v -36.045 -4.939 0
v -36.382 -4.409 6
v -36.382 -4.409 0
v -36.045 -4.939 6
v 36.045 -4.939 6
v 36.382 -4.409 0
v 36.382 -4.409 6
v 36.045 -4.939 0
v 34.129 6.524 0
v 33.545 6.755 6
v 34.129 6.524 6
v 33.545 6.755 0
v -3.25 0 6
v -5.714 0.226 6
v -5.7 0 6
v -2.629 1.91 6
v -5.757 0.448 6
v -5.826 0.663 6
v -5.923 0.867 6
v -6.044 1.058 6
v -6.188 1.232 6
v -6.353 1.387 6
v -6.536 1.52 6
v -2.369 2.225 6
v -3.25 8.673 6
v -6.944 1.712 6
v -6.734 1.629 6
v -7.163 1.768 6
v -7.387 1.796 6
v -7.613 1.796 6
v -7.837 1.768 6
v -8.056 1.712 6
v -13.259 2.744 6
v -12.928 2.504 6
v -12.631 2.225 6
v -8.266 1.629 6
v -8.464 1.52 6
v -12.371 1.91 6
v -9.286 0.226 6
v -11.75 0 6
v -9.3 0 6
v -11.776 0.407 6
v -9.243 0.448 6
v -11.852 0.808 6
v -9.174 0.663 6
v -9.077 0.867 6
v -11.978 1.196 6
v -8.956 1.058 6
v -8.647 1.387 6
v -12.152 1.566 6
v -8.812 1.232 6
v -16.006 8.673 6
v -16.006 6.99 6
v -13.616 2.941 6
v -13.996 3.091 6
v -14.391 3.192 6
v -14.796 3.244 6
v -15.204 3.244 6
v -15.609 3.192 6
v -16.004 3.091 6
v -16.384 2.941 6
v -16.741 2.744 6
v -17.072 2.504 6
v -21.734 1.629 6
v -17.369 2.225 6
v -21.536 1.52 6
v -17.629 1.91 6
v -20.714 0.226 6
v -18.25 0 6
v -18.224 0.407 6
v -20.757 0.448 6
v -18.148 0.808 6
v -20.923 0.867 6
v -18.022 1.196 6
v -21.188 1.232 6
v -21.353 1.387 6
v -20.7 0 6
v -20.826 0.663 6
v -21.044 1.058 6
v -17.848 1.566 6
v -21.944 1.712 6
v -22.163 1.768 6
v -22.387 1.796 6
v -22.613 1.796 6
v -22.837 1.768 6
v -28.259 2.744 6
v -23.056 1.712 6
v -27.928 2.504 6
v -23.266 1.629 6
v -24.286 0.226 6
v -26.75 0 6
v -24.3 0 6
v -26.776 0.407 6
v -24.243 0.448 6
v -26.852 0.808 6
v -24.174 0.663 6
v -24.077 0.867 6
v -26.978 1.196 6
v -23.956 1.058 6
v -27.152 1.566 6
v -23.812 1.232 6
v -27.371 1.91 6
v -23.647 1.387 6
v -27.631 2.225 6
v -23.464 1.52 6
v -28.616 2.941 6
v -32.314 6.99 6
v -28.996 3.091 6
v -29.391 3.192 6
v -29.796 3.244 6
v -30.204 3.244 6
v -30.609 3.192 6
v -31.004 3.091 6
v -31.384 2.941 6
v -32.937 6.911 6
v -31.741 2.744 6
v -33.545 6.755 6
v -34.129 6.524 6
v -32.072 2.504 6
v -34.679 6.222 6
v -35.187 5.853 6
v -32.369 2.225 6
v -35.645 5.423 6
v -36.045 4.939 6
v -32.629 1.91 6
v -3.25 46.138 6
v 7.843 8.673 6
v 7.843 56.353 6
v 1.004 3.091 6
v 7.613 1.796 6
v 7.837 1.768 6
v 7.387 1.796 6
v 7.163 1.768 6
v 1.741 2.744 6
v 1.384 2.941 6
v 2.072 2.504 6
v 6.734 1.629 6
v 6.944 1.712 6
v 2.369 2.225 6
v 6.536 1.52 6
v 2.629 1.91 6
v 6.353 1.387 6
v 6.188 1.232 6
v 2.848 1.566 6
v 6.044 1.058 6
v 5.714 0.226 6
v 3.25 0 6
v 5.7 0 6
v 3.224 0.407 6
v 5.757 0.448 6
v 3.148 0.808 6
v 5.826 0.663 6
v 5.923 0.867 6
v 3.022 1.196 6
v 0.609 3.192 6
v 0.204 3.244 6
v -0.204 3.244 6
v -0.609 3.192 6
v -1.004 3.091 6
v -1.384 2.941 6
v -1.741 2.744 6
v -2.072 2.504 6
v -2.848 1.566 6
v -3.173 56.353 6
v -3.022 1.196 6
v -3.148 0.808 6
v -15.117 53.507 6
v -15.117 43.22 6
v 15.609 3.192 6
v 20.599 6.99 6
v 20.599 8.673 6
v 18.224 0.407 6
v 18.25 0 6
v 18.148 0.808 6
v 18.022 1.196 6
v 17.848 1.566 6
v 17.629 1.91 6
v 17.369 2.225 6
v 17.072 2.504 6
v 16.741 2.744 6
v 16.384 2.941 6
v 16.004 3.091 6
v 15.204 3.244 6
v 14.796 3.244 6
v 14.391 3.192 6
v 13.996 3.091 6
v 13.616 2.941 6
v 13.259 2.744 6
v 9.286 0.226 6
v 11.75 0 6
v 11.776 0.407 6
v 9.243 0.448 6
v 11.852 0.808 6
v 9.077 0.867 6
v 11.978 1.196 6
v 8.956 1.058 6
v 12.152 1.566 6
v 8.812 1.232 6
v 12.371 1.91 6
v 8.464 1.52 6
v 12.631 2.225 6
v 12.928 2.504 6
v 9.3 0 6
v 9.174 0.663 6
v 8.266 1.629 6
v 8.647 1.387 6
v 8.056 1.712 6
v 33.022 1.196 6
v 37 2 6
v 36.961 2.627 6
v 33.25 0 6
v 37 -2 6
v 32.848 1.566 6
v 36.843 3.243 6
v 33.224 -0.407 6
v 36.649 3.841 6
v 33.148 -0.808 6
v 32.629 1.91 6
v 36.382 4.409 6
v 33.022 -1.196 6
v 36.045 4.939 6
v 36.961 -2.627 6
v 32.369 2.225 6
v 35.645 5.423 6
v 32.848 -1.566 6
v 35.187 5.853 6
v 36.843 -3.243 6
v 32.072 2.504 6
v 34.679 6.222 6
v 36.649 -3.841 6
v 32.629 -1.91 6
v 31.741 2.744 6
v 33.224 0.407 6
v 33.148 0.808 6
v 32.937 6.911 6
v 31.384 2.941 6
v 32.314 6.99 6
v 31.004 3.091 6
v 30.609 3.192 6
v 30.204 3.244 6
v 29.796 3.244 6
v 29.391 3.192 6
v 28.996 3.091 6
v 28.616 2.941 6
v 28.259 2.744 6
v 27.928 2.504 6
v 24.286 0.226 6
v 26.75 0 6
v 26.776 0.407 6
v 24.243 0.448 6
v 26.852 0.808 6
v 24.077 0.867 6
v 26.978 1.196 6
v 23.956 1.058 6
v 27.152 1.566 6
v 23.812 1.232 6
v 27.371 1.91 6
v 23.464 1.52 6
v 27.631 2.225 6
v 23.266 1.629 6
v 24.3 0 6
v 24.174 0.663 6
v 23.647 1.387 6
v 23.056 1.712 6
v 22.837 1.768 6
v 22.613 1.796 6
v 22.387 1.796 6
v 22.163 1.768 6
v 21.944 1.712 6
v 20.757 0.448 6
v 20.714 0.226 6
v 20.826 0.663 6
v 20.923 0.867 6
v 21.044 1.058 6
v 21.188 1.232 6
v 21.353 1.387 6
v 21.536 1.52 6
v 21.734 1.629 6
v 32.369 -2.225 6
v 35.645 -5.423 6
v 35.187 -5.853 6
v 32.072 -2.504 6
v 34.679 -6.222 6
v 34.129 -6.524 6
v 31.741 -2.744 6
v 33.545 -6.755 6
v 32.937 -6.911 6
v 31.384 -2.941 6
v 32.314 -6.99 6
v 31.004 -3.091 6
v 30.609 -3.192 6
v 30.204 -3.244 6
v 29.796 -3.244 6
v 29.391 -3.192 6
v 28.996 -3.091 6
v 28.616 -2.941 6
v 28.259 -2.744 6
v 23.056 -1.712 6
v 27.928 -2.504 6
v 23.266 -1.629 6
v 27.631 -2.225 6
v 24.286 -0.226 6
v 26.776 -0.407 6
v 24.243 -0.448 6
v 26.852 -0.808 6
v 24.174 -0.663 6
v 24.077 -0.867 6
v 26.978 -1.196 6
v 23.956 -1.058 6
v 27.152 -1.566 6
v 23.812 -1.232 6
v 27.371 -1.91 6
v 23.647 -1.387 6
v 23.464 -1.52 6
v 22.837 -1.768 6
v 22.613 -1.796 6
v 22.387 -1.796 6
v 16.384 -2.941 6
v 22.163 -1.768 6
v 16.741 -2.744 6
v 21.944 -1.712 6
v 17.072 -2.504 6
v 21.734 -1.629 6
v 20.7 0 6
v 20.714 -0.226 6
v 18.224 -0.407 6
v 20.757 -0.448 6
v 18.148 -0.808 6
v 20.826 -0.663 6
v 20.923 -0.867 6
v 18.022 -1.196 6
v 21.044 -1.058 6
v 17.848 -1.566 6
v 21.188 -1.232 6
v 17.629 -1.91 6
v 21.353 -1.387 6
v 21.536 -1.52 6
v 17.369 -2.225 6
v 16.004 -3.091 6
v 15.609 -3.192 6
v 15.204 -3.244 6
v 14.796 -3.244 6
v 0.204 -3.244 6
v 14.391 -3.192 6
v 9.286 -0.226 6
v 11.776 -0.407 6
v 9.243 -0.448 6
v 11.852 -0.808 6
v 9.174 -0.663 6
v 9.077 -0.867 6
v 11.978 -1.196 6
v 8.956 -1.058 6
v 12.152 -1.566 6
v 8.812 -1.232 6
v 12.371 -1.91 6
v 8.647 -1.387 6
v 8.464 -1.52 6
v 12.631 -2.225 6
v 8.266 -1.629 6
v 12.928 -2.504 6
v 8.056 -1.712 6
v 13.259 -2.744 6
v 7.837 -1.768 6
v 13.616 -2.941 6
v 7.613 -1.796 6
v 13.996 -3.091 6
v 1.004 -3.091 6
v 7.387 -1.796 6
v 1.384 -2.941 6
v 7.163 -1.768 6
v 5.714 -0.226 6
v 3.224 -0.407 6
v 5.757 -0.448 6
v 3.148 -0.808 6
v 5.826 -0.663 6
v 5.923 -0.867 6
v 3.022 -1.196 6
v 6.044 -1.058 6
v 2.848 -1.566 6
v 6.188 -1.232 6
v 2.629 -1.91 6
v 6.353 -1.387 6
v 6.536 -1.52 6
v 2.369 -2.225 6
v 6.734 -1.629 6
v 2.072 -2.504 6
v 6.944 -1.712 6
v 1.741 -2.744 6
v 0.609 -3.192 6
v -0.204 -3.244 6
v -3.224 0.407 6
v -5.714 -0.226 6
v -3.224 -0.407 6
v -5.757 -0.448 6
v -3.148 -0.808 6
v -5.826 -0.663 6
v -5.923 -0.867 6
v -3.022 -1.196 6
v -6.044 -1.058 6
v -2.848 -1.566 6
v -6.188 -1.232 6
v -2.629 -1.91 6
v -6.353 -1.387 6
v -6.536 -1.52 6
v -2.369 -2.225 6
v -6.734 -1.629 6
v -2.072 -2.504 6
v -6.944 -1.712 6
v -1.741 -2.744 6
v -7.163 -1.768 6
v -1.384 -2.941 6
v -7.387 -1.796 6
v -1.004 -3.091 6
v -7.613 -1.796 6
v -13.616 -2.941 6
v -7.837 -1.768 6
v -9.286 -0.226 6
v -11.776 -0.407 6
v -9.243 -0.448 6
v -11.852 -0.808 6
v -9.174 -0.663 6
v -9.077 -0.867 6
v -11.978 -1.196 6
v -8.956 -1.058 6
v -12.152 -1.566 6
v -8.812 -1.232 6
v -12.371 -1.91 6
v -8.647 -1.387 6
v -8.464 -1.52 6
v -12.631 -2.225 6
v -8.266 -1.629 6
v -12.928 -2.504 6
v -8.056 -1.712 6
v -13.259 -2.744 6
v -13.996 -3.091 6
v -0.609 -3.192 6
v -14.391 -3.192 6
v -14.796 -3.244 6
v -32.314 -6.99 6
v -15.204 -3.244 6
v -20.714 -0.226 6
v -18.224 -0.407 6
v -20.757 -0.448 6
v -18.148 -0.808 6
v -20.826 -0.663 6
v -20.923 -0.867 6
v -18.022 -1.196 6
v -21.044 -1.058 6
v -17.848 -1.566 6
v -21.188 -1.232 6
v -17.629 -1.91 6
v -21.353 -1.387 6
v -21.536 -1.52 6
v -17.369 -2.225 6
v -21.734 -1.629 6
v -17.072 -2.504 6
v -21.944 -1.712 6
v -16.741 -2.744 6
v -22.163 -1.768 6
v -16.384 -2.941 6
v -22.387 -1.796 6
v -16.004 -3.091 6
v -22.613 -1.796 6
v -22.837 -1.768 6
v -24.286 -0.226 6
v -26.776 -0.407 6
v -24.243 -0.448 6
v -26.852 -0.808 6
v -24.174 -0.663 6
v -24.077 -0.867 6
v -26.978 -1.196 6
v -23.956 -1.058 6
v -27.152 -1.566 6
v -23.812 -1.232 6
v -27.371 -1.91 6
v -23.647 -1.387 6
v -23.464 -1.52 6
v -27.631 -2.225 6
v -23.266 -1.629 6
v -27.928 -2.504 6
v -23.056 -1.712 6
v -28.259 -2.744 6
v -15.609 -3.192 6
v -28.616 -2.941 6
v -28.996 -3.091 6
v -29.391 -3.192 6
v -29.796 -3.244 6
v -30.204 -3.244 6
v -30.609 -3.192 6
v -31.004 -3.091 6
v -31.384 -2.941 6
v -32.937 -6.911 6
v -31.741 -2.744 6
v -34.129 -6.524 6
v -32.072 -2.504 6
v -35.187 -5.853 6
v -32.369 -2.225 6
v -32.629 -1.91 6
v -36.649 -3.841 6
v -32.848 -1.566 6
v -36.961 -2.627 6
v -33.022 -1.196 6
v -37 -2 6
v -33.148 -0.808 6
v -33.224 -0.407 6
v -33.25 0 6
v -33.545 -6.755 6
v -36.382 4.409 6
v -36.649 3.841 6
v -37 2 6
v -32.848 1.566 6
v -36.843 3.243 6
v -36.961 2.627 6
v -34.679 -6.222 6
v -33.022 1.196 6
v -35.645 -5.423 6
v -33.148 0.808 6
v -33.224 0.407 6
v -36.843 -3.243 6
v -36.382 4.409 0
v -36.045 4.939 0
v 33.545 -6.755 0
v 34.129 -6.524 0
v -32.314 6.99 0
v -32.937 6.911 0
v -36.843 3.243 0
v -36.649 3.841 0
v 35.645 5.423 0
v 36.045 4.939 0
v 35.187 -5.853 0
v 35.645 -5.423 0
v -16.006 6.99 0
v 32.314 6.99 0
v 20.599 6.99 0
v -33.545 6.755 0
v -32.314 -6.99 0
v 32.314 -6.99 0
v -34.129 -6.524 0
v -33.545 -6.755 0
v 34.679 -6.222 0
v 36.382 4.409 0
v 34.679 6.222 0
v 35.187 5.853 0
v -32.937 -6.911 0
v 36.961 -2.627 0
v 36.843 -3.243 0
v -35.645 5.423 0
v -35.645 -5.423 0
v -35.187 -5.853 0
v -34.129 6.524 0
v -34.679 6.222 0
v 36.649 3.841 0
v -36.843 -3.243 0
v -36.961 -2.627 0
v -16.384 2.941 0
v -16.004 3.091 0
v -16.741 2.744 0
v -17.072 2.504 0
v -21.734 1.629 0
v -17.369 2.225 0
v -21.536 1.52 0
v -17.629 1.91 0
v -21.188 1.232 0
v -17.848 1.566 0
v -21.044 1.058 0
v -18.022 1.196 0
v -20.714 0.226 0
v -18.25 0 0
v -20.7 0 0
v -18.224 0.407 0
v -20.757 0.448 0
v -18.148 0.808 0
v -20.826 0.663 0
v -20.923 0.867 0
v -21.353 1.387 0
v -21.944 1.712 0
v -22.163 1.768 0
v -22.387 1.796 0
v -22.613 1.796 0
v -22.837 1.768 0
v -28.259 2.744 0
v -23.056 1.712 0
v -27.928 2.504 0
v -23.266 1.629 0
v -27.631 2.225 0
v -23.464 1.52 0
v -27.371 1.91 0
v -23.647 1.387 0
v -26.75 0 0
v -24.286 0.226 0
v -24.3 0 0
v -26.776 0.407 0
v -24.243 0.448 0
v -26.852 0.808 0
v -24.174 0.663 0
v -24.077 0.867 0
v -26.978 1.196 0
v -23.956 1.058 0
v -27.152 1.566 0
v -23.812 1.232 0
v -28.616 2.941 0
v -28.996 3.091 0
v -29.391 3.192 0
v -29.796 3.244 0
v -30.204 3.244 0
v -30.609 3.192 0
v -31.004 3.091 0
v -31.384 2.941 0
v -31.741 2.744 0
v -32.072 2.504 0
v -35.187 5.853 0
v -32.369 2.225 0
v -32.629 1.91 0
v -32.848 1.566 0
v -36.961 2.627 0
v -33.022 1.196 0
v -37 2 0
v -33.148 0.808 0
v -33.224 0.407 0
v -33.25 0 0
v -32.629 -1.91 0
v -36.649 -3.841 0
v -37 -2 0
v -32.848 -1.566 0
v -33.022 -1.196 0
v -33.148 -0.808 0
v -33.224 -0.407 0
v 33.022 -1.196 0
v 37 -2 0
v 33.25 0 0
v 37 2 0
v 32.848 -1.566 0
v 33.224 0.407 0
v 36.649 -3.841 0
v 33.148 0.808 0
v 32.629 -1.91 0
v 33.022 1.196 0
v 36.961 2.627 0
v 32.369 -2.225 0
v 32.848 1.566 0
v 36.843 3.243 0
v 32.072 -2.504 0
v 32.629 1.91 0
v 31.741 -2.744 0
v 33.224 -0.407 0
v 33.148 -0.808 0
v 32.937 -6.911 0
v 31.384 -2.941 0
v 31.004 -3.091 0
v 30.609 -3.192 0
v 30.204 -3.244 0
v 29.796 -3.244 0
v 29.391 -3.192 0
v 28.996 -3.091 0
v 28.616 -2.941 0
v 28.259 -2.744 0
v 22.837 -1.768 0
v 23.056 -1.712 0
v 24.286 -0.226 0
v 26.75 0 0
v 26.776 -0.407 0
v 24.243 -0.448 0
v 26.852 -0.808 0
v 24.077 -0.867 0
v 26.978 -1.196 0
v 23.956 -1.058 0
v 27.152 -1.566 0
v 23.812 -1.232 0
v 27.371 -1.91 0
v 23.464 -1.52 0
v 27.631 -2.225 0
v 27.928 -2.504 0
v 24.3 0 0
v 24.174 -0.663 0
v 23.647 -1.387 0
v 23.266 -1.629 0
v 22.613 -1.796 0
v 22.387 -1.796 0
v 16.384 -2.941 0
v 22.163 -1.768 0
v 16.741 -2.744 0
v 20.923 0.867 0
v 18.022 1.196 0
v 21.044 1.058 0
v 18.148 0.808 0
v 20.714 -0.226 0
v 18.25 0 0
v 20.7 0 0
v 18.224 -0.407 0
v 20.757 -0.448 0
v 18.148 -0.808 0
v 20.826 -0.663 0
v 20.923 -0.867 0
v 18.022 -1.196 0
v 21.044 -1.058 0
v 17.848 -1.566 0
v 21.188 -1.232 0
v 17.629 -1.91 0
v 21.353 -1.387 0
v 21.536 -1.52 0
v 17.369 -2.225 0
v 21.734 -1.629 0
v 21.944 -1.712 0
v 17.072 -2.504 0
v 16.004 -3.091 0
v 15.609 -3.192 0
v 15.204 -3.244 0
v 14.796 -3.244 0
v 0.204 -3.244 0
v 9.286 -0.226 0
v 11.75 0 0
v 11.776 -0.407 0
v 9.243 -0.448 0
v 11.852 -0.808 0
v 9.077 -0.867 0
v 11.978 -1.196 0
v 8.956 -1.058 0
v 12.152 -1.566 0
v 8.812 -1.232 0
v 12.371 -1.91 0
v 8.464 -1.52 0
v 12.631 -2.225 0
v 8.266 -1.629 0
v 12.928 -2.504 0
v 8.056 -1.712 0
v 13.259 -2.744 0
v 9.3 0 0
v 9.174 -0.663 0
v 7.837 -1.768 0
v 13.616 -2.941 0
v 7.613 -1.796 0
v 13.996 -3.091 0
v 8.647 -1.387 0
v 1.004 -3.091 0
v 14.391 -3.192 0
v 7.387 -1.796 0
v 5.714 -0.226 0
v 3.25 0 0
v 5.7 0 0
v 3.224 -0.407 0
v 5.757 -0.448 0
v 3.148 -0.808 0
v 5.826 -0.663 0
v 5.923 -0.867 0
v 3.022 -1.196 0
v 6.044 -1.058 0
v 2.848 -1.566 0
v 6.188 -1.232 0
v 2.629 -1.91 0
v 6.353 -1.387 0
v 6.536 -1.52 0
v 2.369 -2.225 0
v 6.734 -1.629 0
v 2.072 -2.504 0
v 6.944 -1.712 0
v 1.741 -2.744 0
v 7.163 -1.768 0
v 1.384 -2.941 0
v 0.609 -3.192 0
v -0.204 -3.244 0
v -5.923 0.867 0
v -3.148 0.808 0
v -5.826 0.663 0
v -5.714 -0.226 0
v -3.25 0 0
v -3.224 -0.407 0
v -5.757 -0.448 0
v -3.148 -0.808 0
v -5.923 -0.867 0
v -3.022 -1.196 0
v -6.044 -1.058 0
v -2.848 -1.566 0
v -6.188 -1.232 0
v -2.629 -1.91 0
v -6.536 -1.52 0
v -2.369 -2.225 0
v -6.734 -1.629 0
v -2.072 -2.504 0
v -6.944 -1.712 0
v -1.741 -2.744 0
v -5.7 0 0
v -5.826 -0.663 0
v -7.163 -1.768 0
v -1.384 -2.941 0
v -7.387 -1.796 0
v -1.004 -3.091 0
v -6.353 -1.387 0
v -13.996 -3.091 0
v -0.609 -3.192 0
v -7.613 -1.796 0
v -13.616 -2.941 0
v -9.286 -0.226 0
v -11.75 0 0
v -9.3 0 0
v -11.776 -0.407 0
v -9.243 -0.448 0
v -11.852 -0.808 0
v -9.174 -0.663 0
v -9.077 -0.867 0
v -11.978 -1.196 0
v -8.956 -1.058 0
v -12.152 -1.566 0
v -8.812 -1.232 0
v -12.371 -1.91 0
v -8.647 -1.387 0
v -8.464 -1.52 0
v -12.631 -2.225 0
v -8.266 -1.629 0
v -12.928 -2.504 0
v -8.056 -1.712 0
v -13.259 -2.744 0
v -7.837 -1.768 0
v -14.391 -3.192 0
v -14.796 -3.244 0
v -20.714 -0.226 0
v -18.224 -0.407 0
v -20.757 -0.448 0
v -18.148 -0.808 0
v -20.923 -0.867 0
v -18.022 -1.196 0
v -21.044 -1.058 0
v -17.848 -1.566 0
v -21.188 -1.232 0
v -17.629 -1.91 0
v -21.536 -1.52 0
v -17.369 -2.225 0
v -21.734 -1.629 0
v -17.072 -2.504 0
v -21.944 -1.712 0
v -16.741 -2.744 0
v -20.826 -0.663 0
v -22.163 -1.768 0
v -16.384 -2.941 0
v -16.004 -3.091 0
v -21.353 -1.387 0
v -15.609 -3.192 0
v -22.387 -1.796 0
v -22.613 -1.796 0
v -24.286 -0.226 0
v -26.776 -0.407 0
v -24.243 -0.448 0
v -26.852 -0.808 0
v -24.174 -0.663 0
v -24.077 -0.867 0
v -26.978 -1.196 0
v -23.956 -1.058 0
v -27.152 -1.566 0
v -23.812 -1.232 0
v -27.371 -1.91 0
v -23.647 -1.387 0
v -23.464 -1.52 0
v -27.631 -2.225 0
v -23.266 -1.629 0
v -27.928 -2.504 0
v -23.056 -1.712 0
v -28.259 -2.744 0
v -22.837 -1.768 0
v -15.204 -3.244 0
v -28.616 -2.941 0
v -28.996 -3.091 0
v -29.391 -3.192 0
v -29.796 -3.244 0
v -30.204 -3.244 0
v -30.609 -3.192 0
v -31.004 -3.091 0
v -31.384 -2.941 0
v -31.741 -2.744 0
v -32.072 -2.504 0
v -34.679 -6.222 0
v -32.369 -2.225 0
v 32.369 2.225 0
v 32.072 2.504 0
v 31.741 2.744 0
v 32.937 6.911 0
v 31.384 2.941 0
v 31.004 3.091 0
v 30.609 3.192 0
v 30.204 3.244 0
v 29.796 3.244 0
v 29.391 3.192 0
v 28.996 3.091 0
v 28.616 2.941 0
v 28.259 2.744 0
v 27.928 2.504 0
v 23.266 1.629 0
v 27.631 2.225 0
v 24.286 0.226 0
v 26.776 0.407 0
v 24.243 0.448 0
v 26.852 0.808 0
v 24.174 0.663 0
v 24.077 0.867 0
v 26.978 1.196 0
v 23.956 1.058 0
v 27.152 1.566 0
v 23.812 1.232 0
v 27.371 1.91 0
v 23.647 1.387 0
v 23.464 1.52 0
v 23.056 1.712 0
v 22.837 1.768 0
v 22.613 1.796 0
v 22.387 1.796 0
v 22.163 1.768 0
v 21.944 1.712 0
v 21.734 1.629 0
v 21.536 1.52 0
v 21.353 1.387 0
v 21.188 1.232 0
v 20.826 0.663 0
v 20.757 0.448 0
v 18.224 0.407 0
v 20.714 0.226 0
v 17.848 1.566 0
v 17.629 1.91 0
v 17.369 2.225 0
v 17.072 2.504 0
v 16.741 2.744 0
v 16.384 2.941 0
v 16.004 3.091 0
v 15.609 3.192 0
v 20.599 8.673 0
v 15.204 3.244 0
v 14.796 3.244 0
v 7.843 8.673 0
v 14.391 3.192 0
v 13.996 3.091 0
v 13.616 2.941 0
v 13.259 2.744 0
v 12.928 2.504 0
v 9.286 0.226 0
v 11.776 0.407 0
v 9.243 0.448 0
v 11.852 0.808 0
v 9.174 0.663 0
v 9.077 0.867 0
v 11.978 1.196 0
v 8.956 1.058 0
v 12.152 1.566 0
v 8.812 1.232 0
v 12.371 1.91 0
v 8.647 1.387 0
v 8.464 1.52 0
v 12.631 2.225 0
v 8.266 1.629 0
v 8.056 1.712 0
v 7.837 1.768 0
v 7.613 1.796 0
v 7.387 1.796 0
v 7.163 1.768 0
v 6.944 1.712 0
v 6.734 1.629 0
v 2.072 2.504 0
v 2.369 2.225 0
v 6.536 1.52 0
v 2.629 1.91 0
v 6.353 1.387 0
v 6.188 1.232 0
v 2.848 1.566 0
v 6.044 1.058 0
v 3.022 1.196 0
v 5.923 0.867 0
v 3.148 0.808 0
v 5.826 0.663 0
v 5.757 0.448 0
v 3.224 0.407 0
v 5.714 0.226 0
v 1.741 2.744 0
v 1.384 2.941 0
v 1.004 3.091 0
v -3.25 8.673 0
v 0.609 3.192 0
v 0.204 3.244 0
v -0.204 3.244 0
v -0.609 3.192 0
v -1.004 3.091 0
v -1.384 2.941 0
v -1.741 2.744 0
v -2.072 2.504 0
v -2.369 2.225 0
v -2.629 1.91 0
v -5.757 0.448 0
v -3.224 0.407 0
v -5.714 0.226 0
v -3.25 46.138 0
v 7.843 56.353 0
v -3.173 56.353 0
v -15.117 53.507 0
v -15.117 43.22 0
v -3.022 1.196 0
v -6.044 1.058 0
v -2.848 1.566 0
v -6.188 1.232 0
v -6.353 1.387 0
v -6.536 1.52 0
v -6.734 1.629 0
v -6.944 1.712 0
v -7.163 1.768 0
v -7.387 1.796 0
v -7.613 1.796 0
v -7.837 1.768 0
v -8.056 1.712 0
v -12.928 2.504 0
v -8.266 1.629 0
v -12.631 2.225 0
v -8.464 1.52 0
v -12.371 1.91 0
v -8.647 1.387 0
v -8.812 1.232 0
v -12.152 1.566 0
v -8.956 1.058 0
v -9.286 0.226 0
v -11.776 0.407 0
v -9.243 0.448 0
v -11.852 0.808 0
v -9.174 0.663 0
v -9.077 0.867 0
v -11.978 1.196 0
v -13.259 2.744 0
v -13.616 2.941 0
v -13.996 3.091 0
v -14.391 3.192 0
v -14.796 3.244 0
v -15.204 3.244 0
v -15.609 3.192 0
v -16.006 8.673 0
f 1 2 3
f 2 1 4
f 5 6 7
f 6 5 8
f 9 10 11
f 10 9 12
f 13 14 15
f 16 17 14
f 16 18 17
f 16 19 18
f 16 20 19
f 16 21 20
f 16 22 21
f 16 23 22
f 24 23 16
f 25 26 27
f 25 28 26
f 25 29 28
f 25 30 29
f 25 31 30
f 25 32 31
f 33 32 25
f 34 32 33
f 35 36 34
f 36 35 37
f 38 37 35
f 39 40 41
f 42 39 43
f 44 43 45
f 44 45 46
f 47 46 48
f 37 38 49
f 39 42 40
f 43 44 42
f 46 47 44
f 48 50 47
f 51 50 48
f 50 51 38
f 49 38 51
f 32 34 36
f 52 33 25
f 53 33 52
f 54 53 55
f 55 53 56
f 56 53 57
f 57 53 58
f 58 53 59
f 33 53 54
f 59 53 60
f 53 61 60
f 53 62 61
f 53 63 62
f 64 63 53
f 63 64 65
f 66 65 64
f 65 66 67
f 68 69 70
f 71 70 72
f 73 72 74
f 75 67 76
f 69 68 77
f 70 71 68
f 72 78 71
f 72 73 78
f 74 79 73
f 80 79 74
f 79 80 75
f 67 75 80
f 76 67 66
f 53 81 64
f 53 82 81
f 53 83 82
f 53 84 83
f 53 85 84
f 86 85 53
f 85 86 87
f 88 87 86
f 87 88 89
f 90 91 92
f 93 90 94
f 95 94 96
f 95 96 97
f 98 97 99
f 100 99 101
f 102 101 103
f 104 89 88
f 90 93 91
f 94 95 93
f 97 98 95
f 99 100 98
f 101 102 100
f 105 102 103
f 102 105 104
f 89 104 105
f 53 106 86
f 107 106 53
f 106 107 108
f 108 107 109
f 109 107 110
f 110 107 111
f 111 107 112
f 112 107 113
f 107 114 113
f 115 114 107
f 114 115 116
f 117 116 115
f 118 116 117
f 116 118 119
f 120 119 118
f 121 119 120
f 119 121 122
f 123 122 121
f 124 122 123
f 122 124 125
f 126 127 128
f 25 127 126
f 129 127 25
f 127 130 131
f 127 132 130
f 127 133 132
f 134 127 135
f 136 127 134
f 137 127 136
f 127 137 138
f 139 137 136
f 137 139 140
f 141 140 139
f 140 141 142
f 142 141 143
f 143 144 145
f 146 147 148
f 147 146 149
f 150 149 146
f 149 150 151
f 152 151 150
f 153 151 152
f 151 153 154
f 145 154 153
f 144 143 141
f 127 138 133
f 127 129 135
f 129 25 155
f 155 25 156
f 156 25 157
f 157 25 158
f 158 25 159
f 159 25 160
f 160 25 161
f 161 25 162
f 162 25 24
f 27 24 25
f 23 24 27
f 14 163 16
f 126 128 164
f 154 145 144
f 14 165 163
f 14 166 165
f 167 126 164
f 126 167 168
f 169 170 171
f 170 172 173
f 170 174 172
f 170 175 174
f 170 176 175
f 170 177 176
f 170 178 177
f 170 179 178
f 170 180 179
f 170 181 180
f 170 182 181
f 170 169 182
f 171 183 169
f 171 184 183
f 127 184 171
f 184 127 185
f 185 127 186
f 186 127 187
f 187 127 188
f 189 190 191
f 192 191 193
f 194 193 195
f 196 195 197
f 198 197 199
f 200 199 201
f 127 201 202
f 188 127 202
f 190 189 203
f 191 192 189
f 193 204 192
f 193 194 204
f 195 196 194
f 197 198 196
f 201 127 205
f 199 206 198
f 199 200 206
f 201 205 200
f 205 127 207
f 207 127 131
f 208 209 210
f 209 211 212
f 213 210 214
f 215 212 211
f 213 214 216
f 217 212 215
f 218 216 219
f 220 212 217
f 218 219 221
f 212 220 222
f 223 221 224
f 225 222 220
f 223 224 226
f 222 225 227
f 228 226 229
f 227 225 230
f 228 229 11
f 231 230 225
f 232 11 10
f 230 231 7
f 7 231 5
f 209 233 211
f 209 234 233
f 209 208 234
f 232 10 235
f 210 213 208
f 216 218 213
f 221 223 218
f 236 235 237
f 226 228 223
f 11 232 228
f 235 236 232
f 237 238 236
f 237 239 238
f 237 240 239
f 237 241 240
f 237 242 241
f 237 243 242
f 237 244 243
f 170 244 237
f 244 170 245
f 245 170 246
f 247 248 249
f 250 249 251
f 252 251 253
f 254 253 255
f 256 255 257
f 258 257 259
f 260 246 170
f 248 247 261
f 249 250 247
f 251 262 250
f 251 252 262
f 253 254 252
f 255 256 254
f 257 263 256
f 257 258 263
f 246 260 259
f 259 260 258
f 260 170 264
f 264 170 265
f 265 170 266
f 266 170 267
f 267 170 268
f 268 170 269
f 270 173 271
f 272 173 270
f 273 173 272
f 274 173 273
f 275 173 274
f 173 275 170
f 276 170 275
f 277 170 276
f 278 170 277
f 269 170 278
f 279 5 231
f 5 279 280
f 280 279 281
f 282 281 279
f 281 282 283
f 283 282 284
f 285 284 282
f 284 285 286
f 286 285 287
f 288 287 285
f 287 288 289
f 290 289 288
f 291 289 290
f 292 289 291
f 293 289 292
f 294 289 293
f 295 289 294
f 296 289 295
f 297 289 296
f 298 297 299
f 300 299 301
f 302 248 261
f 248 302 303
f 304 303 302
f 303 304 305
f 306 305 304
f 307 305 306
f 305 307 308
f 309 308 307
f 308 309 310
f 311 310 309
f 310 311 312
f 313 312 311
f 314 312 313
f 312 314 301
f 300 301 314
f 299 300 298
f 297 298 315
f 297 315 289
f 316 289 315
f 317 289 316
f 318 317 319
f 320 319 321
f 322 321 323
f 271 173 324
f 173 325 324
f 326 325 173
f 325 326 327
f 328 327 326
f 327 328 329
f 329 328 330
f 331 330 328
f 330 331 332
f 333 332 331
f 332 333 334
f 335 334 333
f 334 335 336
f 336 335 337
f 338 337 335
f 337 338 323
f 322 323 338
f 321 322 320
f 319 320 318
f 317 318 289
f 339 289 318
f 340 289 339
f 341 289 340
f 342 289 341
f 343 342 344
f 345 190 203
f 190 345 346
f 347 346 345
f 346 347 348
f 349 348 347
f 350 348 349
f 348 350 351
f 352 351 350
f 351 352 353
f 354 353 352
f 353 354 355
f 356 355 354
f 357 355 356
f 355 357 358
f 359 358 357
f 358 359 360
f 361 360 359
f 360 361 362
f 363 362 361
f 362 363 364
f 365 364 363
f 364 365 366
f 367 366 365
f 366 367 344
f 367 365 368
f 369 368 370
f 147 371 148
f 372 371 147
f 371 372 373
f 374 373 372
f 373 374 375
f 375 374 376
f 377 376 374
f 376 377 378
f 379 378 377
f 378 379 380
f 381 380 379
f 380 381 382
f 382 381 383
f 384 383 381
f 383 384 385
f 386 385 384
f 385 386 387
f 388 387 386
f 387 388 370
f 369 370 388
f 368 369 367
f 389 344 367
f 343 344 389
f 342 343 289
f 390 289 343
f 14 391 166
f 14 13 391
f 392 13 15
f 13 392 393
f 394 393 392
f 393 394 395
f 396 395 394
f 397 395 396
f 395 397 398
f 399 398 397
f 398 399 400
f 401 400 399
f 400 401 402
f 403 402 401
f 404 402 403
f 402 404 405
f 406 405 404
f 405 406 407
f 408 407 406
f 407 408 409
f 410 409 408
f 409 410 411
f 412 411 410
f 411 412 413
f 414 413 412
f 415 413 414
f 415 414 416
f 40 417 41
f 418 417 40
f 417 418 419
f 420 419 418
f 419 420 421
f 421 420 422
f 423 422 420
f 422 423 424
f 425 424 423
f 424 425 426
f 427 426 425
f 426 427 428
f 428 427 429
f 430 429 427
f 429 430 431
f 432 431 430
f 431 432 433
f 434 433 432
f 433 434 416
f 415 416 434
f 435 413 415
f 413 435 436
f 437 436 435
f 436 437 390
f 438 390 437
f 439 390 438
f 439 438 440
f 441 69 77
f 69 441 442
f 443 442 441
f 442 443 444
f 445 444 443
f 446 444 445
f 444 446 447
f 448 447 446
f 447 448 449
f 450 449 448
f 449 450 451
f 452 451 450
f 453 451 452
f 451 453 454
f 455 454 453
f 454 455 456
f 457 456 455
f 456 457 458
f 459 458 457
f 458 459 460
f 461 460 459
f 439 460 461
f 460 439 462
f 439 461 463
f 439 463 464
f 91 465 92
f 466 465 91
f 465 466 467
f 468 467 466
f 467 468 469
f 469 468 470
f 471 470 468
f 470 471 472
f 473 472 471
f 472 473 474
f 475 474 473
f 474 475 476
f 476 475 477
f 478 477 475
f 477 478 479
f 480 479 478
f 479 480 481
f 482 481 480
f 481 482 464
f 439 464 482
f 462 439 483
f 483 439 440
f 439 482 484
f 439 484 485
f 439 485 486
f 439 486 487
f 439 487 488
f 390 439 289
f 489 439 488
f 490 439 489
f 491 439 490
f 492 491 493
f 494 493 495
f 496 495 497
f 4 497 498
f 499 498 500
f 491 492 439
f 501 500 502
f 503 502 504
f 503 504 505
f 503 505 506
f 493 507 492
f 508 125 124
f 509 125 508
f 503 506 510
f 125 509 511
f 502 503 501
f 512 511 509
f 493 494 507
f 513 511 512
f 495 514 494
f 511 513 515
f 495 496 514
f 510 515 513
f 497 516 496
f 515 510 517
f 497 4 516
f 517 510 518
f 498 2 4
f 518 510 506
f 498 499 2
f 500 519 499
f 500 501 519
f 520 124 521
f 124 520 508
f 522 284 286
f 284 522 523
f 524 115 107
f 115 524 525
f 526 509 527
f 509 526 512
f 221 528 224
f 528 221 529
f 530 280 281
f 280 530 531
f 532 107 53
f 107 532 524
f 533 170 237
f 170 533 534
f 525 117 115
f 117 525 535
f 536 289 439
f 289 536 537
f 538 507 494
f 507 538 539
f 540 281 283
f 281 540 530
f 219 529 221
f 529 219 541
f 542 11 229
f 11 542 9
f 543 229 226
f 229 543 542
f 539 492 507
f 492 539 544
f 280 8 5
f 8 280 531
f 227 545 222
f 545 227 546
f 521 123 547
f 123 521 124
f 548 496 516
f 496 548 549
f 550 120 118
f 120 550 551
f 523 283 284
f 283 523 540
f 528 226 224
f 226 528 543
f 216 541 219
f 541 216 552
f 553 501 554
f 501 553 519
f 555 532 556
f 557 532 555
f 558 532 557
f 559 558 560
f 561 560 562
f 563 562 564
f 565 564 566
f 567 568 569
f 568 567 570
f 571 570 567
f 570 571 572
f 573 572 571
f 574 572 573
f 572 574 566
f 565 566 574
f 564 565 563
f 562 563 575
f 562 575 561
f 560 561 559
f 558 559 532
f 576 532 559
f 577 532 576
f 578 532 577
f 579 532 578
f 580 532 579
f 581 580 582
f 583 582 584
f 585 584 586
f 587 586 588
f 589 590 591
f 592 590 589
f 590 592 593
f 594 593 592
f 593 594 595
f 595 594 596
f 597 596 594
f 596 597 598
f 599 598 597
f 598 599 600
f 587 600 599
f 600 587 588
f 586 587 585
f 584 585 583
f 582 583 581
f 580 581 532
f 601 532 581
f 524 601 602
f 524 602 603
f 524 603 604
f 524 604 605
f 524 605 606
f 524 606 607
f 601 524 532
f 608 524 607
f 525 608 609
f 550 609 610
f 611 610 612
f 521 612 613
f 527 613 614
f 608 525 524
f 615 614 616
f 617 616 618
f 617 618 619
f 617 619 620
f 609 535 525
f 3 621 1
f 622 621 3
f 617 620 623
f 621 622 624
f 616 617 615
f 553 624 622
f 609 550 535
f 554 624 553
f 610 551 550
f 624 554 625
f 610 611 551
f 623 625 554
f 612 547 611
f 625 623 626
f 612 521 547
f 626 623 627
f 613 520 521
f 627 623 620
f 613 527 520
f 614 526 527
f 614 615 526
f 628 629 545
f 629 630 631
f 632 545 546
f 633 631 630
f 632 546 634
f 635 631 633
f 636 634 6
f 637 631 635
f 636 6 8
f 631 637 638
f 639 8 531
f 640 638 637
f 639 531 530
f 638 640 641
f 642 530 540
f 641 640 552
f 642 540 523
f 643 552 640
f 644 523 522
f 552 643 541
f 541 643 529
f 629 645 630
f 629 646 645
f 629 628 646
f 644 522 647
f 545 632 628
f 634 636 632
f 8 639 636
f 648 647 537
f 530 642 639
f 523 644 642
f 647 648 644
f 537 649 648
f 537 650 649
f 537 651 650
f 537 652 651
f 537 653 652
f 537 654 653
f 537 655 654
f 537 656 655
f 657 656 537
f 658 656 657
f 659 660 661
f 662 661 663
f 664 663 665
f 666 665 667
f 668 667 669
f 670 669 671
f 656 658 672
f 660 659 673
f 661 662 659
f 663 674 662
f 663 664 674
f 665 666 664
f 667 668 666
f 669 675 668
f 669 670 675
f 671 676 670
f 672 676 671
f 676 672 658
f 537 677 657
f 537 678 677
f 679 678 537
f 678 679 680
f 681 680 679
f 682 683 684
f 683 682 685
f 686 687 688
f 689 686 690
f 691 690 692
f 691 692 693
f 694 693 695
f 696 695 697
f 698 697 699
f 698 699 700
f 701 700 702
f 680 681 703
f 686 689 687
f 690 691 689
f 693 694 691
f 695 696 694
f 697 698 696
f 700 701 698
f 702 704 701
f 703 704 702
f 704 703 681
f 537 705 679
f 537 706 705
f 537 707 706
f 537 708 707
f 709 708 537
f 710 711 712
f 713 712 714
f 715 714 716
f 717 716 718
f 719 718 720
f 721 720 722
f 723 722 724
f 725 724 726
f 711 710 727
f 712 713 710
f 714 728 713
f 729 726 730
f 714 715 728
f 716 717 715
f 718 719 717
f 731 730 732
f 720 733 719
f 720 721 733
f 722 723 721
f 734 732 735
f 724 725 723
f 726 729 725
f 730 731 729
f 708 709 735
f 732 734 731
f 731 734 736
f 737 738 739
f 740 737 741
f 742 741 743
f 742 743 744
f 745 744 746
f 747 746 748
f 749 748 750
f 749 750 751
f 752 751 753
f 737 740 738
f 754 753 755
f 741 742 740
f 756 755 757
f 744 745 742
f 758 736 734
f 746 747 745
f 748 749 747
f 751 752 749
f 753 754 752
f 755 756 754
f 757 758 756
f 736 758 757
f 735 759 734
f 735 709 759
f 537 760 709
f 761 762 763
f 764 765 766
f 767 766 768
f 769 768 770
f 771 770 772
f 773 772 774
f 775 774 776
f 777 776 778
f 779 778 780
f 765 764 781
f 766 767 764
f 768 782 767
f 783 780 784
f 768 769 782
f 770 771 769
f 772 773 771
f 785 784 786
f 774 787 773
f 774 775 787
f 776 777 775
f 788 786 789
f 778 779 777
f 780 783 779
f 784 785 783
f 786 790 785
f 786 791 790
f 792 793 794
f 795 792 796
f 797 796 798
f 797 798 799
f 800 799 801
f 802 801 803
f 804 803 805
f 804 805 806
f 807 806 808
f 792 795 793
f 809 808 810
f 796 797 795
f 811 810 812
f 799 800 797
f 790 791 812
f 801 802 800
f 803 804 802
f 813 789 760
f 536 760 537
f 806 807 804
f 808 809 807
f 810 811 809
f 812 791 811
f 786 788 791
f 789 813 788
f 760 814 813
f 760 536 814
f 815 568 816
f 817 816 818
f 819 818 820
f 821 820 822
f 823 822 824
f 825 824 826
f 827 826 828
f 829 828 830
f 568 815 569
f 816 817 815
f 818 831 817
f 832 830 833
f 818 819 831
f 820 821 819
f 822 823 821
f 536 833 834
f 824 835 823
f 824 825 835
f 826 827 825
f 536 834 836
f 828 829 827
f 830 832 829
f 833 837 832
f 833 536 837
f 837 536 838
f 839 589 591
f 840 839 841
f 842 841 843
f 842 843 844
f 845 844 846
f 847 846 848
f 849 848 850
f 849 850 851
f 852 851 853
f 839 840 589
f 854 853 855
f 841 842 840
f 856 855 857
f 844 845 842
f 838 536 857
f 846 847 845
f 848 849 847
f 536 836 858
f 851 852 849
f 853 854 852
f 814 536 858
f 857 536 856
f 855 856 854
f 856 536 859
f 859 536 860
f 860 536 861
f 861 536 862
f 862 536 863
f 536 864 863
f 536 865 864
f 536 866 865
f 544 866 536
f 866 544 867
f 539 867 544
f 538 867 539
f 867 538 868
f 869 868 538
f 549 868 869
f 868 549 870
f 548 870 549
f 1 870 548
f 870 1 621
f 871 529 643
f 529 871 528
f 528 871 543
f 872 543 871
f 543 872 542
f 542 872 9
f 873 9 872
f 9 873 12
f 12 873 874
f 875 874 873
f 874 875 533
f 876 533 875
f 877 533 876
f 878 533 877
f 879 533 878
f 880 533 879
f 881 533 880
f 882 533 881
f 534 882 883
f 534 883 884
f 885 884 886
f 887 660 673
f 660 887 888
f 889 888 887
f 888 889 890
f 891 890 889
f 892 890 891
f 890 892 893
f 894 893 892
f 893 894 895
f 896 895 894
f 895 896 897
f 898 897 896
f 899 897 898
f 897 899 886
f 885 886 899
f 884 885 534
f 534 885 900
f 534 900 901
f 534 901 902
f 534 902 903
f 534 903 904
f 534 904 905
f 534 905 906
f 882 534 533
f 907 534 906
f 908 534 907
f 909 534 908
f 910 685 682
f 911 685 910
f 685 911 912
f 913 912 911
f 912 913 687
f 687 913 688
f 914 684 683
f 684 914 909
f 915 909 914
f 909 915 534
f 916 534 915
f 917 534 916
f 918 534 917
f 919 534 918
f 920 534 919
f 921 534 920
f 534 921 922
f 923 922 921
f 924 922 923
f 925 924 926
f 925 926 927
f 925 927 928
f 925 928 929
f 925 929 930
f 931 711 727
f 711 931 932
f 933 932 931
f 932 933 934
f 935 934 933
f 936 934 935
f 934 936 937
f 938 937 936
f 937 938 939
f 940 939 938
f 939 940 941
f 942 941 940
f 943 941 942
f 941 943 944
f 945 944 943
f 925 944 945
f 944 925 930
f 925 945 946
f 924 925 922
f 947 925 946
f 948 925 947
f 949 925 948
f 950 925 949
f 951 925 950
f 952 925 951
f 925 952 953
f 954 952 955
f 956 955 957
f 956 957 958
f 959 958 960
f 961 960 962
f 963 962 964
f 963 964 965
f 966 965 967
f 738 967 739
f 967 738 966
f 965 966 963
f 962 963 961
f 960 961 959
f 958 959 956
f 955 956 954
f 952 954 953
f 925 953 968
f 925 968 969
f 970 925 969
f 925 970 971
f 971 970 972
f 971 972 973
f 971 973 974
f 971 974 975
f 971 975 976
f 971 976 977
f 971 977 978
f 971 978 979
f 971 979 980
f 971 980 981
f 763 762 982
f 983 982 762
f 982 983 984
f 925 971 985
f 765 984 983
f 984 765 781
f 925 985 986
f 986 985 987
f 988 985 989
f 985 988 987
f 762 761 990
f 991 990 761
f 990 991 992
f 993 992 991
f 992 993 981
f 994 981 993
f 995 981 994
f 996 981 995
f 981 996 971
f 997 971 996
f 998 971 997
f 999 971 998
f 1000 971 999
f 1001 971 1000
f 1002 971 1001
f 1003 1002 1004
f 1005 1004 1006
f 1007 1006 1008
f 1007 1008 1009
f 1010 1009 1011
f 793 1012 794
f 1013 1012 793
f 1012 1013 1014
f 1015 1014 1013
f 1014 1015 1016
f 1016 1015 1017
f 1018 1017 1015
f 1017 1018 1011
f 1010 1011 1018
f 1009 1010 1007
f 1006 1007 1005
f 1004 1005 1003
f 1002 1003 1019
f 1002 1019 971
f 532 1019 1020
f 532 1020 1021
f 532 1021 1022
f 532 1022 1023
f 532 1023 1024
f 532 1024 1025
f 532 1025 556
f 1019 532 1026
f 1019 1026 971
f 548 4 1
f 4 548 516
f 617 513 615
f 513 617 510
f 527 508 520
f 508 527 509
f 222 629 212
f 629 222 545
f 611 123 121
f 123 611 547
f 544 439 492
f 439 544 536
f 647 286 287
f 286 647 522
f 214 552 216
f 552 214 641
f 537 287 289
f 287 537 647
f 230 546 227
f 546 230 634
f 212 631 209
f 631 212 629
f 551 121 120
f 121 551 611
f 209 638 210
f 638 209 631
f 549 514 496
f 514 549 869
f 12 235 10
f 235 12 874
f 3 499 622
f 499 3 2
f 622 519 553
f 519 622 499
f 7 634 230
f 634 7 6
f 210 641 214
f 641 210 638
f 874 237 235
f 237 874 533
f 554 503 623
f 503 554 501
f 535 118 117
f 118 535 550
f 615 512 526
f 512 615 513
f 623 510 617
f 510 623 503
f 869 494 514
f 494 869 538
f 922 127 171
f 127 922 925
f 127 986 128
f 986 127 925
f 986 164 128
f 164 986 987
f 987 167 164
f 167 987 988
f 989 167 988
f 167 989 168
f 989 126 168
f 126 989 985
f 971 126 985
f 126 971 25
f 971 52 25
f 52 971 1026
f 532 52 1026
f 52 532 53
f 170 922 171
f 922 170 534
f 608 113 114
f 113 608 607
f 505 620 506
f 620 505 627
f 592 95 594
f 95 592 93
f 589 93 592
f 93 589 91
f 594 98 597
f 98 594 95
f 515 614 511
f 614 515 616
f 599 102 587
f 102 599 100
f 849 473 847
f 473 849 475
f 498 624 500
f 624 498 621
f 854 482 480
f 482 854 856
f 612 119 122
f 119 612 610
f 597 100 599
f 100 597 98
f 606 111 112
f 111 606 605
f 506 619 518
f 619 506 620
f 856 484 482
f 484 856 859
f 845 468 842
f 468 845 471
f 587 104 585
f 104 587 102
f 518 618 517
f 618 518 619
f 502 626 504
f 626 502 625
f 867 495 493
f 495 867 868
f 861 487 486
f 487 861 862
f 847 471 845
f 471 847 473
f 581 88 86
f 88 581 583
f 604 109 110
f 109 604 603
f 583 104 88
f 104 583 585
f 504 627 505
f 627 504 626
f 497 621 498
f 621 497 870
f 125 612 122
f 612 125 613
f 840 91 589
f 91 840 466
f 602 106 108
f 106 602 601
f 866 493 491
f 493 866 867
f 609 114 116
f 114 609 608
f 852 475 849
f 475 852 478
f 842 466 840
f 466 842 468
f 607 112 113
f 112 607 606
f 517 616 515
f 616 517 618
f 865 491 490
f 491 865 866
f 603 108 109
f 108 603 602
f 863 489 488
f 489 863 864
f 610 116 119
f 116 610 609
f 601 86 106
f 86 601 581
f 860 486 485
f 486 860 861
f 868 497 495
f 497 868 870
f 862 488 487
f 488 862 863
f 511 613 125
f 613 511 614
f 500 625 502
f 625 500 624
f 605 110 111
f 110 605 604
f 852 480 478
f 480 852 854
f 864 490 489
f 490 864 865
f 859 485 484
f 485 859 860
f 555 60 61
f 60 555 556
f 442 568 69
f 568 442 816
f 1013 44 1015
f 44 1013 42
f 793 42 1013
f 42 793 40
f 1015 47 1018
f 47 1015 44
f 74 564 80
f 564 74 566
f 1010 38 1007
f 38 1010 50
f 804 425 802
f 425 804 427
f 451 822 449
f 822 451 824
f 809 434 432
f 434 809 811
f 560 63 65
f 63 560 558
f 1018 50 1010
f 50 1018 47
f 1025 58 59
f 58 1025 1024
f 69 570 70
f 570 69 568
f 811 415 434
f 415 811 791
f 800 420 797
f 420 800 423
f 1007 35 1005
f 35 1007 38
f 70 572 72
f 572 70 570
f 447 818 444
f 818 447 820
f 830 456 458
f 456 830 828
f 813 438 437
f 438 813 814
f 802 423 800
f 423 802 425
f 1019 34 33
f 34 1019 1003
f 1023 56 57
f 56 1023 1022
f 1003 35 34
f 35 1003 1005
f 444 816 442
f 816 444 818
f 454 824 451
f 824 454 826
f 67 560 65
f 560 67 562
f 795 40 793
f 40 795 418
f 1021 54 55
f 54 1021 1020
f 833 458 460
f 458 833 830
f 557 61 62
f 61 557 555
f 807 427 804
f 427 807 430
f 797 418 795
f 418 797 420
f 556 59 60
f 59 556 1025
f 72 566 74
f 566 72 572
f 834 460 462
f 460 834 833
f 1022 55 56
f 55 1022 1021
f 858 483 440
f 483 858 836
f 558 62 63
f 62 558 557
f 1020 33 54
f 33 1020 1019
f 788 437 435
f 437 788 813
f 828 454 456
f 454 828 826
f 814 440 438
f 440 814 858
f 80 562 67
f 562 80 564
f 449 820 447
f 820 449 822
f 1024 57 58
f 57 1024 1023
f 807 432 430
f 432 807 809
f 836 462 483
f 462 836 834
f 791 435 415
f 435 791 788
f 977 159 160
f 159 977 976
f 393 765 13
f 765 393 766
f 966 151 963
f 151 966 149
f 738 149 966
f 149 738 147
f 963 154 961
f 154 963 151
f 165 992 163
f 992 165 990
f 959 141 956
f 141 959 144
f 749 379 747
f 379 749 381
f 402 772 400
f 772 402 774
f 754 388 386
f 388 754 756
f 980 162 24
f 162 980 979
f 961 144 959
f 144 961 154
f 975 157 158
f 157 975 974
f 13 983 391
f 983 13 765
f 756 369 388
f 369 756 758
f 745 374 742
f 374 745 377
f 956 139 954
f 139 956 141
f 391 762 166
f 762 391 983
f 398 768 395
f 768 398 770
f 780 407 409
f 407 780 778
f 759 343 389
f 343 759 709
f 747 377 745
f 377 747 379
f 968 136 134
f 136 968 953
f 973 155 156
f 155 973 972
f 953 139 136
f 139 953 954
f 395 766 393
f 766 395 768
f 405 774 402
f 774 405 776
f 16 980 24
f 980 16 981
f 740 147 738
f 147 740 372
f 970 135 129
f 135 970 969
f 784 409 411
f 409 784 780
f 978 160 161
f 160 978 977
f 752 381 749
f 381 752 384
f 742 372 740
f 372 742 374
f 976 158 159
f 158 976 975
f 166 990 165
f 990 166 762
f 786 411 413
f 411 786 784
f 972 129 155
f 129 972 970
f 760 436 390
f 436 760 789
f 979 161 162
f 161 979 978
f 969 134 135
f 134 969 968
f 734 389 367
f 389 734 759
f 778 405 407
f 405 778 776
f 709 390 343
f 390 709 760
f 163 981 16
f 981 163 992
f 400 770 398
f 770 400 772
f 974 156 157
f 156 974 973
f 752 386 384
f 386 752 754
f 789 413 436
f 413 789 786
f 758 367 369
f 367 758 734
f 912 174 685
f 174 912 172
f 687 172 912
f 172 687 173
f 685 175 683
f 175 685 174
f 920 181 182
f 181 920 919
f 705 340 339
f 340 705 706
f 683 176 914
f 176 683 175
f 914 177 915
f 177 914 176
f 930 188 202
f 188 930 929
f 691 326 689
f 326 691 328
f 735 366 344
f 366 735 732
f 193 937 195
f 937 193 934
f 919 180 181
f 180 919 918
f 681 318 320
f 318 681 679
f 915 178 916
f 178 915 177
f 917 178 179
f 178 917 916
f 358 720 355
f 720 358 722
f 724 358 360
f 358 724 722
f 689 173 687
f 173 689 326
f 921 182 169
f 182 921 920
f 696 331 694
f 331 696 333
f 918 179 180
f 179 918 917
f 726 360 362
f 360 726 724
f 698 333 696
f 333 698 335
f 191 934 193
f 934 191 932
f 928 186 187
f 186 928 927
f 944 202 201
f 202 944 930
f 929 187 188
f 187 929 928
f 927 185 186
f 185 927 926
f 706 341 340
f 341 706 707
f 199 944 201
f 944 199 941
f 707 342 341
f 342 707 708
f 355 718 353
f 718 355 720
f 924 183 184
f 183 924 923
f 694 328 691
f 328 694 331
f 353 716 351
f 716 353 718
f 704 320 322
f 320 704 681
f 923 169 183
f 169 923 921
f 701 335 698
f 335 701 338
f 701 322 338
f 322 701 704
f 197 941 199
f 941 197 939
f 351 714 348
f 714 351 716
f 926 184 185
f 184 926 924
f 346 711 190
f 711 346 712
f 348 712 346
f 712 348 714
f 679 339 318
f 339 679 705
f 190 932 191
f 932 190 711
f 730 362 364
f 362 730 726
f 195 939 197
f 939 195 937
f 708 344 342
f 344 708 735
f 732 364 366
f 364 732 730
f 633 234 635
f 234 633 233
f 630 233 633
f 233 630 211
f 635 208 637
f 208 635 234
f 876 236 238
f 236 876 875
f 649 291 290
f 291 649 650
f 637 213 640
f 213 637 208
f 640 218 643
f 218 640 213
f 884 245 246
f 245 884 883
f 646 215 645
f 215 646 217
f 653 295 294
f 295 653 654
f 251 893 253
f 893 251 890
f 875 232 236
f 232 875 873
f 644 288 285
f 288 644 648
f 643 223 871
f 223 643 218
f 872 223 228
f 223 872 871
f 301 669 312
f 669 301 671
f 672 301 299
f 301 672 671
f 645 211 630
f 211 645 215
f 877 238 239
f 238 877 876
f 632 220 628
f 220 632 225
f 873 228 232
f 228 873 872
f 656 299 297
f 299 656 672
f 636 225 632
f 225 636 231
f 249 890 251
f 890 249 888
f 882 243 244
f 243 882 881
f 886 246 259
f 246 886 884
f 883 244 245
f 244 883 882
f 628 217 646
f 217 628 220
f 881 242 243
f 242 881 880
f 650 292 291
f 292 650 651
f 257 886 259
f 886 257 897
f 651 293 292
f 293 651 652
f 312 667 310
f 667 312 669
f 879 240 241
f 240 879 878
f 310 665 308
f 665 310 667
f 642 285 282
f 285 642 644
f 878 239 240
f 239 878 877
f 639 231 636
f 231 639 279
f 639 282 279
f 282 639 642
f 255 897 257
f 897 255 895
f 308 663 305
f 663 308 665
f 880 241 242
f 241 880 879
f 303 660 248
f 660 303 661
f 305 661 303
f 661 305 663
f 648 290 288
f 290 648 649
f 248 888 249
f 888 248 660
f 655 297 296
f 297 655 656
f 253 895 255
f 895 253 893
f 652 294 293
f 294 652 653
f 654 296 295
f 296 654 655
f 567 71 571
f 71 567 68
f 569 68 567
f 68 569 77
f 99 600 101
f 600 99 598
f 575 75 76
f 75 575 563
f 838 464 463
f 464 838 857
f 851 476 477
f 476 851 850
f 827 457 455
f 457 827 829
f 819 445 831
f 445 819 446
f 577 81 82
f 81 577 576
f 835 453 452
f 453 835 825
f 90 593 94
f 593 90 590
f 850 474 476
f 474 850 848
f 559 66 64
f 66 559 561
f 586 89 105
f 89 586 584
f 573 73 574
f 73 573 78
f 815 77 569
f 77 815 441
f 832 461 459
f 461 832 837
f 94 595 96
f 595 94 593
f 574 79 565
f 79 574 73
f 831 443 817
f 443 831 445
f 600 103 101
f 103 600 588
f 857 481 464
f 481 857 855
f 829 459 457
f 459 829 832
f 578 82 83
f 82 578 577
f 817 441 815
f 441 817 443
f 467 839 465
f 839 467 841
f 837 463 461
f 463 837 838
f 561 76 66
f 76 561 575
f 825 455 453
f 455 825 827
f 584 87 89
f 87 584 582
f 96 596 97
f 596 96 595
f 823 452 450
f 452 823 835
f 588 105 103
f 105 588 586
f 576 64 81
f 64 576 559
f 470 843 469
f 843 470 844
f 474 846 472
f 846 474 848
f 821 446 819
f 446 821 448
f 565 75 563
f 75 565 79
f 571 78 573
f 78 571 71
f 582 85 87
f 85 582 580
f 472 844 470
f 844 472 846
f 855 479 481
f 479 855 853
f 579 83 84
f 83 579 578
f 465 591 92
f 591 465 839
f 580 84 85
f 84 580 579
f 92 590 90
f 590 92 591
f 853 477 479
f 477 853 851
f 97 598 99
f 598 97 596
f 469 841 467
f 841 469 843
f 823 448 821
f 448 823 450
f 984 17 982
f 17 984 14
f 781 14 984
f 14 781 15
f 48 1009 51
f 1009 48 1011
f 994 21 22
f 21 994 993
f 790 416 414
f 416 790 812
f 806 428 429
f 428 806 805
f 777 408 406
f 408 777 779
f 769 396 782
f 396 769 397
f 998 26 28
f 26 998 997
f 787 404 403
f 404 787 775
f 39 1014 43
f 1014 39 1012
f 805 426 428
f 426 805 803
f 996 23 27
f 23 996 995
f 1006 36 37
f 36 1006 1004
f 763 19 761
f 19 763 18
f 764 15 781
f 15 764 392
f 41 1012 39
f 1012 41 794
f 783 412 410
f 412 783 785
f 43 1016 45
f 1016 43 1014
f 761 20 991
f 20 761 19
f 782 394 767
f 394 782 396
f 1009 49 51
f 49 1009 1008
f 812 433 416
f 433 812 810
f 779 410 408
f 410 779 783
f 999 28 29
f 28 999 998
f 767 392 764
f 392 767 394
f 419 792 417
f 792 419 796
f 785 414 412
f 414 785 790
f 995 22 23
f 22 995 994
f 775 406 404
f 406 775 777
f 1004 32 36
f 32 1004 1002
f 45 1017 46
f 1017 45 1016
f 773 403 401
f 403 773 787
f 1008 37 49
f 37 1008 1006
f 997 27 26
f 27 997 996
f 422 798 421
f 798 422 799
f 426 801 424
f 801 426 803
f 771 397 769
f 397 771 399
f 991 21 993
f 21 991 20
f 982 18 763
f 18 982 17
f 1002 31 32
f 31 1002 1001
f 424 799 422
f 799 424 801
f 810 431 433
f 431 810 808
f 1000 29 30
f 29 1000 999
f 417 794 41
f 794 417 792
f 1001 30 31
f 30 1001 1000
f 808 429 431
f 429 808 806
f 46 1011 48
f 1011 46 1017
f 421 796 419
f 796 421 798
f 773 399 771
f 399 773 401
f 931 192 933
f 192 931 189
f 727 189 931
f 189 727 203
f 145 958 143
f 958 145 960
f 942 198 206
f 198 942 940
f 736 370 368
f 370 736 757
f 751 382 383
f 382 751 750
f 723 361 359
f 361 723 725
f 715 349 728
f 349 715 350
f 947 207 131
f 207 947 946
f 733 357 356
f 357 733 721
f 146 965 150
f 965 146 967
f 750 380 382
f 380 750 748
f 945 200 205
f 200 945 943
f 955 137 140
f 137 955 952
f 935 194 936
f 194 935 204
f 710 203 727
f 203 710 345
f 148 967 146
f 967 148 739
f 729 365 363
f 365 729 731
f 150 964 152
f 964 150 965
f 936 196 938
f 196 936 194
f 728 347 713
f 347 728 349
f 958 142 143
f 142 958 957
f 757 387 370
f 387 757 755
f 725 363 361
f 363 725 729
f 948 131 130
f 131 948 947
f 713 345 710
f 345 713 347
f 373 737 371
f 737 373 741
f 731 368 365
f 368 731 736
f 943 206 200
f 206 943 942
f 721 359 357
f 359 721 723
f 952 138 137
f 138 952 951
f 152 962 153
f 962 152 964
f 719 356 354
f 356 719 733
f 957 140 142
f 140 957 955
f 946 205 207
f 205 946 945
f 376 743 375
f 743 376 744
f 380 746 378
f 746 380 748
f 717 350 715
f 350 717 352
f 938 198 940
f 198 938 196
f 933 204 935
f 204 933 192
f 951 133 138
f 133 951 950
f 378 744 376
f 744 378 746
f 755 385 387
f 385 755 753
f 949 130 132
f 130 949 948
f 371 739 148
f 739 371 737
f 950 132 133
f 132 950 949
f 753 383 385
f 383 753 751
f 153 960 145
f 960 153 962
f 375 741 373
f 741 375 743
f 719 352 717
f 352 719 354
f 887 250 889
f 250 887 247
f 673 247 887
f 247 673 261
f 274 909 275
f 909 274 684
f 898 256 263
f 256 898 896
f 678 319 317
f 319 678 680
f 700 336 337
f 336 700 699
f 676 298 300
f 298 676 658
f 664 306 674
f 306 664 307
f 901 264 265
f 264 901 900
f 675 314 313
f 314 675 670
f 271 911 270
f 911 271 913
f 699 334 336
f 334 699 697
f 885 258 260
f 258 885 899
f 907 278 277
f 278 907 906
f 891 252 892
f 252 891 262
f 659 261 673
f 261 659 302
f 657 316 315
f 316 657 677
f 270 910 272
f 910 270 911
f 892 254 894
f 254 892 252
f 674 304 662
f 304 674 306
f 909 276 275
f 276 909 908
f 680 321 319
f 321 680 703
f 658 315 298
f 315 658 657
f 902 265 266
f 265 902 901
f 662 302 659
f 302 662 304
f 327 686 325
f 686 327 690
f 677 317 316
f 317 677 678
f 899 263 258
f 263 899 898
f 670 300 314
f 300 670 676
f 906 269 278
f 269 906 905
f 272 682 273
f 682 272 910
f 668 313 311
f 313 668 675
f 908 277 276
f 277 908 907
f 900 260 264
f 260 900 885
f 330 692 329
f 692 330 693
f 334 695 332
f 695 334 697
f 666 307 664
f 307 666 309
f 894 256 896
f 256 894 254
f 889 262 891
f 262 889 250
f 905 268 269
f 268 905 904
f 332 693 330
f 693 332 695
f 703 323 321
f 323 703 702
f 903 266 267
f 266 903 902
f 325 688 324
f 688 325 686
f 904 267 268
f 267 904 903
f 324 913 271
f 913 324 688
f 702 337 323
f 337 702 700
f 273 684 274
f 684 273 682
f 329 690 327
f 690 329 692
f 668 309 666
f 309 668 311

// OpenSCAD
$fn = 50;


difference() {
	union() {
		hull() {
			translate(v = [-32.0000000000, 2.0000000000, 0]) {
				cylinder(h = 6, r = 5);
			}
			translate(v = [32.0000000000, 2.0000000000, 0]) {
				cylinder(h = 6, r = 5);
			}
			translate(v = [-32.0000000000, -2.0000000000, 0]) {
				cylinder(h = 6, r = 5);
			}
			translate(v = [32.0000000000, -2.0000000000, 0]) {
				cylinder(h = 6, r = 5);
			}
		}
		translate(v = [0, 55, 0]) {
			linear_extrude(height = 6) {
				text(font = "DejaVu Sans Mono:style=Bold", halign = "center", size = 57.0000000000, text = "1", valign = "top");
			}
		}
	}
	union() {
		translate(v = [-30.0000000000, 0.0000000000, 0]) {
			translate(v = [0, 0, -100]) {
				cylinder(h = 200, r = 3.2500000000);
			}
		}
		translate(v = [-15.0000000000, 0.0000000000, 0]) {
			translate(v = [0, 0, -100]) {
				cylinder(h = 200, r = 3.2500000000);
			}
		}
		translate(v = [0, 0, -100]) {
			cylinder(h = 200, r = 3.2500000000);
		}
		translate(v = [15.0000000000, 0.0000000000, 0]) {
			translate(v = [0, 0, -100]) {
				cylinder(h = 200, r = 3.2500000000);
			}
		}
		translate(v = [30.0000000000, 0.0000000000, 0]) {
			translate(v = [0, 0, -100]) {
				cylinder(h = 200, r = 3.2500000000);
			}
		}
		translate(v = [-30.0000000000, 0.0000000000, 0]) {
			translate(v = [0, 0, -100]) {
				cylinder(h = 200, r = 1.8000000000);
			}
		}
		translate(v = [-22.5000000000, 0.0000000000, 0]) {
			translate(v = [0, 0, -100]) {
				cylinder(h = 200, r = 1.8000000000);
			}
		}
		translate(v = [-15.0000000000, 0.0000000000, 0]) {
			translate(v = [0, 0, -100]) {
				cylinder(h = 200, r = 1.8000000000);
			}
		}
		translate(v = [-7.5000000000, 0.0000000000, 0]) {
			translate(v = [0, 0, -100]) {
				cylinder(h = 200, r = 1.8000000000);
			}
		}
		translate(v = [0, 0, -100]) {
			cylinder(h = 200, r = 1.8000000000);
		}
		translate(v = [7.5000000000, 0.0000000000, 0]) {
			translate(v = [0, 0, -100]) {
				cylinder(h = 200, r = 1.8000000000);
			}
		}
		translate(v = [15.0000000000, 0.0000000000, 0]) {
			translate(v = [0, 0, -100]) {
				cylinder(h = 200, r = 1.8000000000);
			}
		}
		translate(v = [22.5000000000, 0.0000000000, 0]) {
			translate(v = [0, 0, -100]) {
				cylinder(h = 200, r = 1.8000000000);
			}
		}
		translate(v = [30.0000000000, 0.0000000000, 0]) {
			translate(v = [0, 0, -100]) {
				cylinder(h = 200, r = 1.8000000000);
			}
		}
	}
}
